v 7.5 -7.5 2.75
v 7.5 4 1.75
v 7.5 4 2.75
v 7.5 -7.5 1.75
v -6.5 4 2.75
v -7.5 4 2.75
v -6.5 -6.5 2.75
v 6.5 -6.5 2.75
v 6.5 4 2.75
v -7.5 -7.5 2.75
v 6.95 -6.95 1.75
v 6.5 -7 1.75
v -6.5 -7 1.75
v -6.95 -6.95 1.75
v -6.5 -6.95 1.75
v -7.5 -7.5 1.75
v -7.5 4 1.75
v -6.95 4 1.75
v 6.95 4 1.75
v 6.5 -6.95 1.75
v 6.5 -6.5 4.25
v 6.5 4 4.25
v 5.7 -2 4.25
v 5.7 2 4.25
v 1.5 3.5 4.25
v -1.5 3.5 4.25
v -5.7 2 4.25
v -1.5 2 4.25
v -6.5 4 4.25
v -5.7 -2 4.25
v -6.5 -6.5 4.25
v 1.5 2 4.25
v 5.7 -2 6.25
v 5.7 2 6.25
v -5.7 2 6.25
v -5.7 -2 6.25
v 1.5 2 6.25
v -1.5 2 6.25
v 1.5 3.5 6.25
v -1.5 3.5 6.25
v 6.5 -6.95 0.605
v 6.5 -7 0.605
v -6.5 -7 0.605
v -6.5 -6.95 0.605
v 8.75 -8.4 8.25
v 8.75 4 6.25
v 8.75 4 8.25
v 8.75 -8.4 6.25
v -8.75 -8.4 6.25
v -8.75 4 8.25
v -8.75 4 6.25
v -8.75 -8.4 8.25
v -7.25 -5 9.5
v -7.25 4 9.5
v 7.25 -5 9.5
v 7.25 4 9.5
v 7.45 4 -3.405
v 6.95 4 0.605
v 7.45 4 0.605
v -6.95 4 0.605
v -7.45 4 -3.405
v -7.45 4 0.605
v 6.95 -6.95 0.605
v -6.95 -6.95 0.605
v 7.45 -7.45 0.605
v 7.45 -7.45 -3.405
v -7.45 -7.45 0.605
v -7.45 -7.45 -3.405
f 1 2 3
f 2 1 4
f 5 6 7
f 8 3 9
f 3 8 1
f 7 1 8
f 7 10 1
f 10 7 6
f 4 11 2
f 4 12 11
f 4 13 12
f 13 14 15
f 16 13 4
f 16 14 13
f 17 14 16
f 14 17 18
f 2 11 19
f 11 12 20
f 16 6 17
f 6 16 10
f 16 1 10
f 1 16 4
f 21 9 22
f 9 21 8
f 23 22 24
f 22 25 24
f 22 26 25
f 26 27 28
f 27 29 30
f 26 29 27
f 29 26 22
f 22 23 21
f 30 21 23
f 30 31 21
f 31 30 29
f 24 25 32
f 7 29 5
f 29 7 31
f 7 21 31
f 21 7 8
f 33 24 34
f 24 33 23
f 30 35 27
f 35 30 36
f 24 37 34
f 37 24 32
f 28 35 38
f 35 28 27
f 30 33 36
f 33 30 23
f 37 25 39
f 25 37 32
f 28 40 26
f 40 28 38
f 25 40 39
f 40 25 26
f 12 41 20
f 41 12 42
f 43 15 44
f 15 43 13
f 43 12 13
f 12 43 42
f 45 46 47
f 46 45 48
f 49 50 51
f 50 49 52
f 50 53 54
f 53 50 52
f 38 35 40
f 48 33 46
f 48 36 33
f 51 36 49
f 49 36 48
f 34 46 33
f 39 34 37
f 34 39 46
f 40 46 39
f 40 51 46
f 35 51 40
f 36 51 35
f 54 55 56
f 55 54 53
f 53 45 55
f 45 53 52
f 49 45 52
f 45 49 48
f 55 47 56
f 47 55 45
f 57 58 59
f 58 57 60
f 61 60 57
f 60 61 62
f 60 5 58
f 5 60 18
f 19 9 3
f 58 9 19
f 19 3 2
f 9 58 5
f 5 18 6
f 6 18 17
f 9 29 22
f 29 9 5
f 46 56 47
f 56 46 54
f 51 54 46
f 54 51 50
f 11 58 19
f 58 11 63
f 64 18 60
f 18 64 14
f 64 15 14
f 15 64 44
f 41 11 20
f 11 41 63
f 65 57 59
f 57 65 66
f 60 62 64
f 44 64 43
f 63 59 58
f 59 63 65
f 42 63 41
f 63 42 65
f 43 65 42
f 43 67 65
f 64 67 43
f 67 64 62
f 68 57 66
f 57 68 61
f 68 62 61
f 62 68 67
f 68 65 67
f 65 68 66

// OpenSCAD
//Enum Switch Type
MX   = 0;  // Generic MX
Choc = 1;  // Low profile
Alps = 2;  // For Your Superiority Complex's Needs

//Switch cutawy Type
Cherry = 0;
Box    = 1;
Alps   = 2;

//Cap type applys to MX only?
//Cherry = 0;
DSA = 1;
SA  = 2;
MT3 = 3;

//parameters
plate_thickness = 1;
plate_size = 15.6;
edge_offset = 1;
bottom_height = 5;
bottom_size = plate_size - 2;

top_height = 11.6;

switch_height = 3.0;
switch_thick = 1;
switch_width = 5;
switch_length = 3;

cap_height = .38*25.4;
cap_heightShift = 0.69*25.4;
cap_width = 18.3;

bottom_height = 4.5;
bottom_chamfer_width = 3.05;
bottom_chamfer_height =  1;
bottom_chamfer_thickness = .6;

bottom_peg_diameter = 4.075/.97;
bottom_peg_height =  3.5;
bottom_peg_chamfer = .5;
bottom_peg_side_scale = 1.7/4;

//dummy key switch with caps to check position
module Switch(switchScale= [1,1,1], CapColor = "ivory", StemColor = "black", clipLength = 0, type = Choc, Caps = DSA, Row = 0)
{
  if (type == MX){
    difference(){
      union(){
        translate([0,0,-switch_height])
        {
          color("grey"){
            translate([-bottom_size/2, -bottom_size/2 ,0])cube([bottom_size,bottom_size,bottom_height]);
            translate([-plate_size/2-edge_offset /2, -plate_size/2-edge_offset/2, bottom_height])cube([15.6+edge_offset ,15.6+edge_offset ,1]);

            translate([-plate_size/2, -plate_size/2, bottom_height])cube([15.6,15.6,1]);
            translate([-plate_size/2, -plate_size/2, bottom_height])cube([15.6,15.6,1]);

            translate([0,0, bottom_height+plate_thickness])translate([-15.6/2,13.6/2,0])rotate([90,0,0])linear_extrude(13.6)polygon(points = [[0,0], [15.6, 0], [13.6, 5.6], [2,5.6]]);
          }

          color(StemColor){
            translate([-switch_width/2, -switch_thick/2, top_height-1])cube([switch_width, switch_thick, switch_height]);
            translate([-switch_thick/2, -switch_length/2, top_height-1])cube([switch_thick, switch_length, switch_height]);
            translate([-plate_size/4, -plate_size/6, top_height-.5])cube([plate_size/2, plate_size/3, 0.25]);
          }

          scale(switchScale)color(CapColor){
            translate([0,0,cap_heightShift-2])rotate([0,0,45])cylinder(d1 = cap_width*sqrt(2),d2 = (plate_size -4)*sqrt(2), 7.5, $fn=4, center = true);
          }

          color("grey"){
            translate([0,0, -(bottom_peg_height -bottom_peg_chamfer)]){
              cylinder(d=bottom_peg_diameter, h= bottom_peg_height -bottom_peg_chamfer);
              translate([5,0,0])scale(v=[bottom_peg_side_scale,bottom_peg_side_scale,1])cylinder(d=bottom_peg_diameter, h= bottom_peg_height -bottom_peg_chamfer);
              translate([-5,0,0])scale(v=[bottom_peg_side_scale,bottom_peg_side_scale,1])cylinder(d=bottom_peg_diameter, h= bottom_peg_height -bottom_peg_chamfer);

              translate([0,0, -bottom_peg_chamfer]){
                cylinder(d2=bottom_peg_diameter , d1 = bottom_peg_diameter -2*bottom_peg_chamfer, h= bottom_peg_chamfer);
                translate([5,0,0])scale(v=[bottom_peg_side_scale,bottom_peg_side_scale,1])cylinder(d2=bottom_peg_diameter , d1 = bottom_peg_diameter -2*bottom_peg_chamfer, h= bottom_peg_chamfer);
                translate([-5,0,0])scale(v=[bottom_peg_side_scale,bottom_peg_side_scale,1])cylinder(d2=bottom_peg_diameter , d1 = bottom_peg_diameter -2*bottom_peg_chamfer, h= bottom_peg_chamfer);
              }
            }
          }
        }
      }
      if (clipLength != 0){ // commiting unholy act in name of ergonomics
        translate([0, -sign(clipLength)*7.8-clipLength,  0])cube([20, 15.6, 40], center = true);
      }
    }
  } else if (type == Choc){
    difference(){
      union(){
        translate([0,0,1.75]){
          difference(){
            translate([0,0,0.5])cube([15,15,1], center = true);
            //cuts
        //    translate([15/2-1/2,0,.5])cube([1,10.5,2], center = true);
        //    translate([-15/2+1/2,0,.5])cube([1,10.5,2], center = true);
          }

          translate([0,0,1.5])cube([13,13,2], center = true);
          color(StemColor)translate([0,0,4])cube([11.4,4,3], center = true);
          color(StemColor)translate([0,1,4])cube([3,5,3], center = true);
          color("DarkSlateGray")translate([0,0,-1])cube([13,14,2,],center = true);
          color("DarkSlateGray")translate([0,0,-2-2.5])cylinder(d=3.3, 2.5);
          color("DarkSlateGray")translate([5,0,-2-2.5])cylinder(d=1.6, 2.5);
          color("DarkSlateGray")translate([-5,0,-2-2.5])cylinder(d=1.6, 2.5);

          //cap
          scale(switchScale)color(CapColor)hull(){
            translate([0,0,4.5+1])cube([17.5,16.8,2],center = true);
            translate([0,1.25,4.5+1+1.5])cube([14.5,12.5,1.5],center = true);
          }
        }
      }
      if (clipLength != 0){ // commiting unholy act in name of ergonomics
        translate([0, -sign(clipLength)*7.8-clipLength,  0])cube([20, 15.6, 40], center = true);
      }
    }
  }
  else if (type == Alps){
    //TODO build Alps MockUp
  }
}

module Cutter()
{
  bottom_height = 4.5;
  bottom_chamfer_width = 3;
  bottom_chamfer_height =  1;
  bottom_chamfer_thickness = .6;

  bottom_peg_diameter = 4;
  bottom_peg_height =  3;
  bottom_peg_chamfer = 1;
  bottom_peg_side_scale = 1.7/4;

  translate([-bottom_size/2, -bottom_size/2 ,0])cube([bottom_size,bottom_size,bottom_height]);

  translate([0,0, -(bottom_peg_height -bottom_peg_chamfer)]){
    cylinder(d=bottom_peg_diameter, h= bottom_peg_height -bottom_peg_chamfer);
    translate([5,0,0])scale(v=[bottom_peg_side_scale,bottom_peg_side_scale,1])cylinder(d=bottom_peg_diameter, h= bottom_peg_height -bottom_peg_chamfer);
    translate([-5,0,0])scale(v=[bottom_peg_side_scale,bottom_peg_side_scale,1])cylinder(d=bottom_peg_diameter, h= bottom_peg_height -bottom_peg_chamfer);

    translate([0,0, -bottom_peg_chamfer]){
      cylinder(d2=bottom_peg_diameter , d1 = bottom_peg_diameter -2*bottom_peg_chamfer, h= bottom_peg_chamfer);
      translate([5,0,0])scale(v=[bottom_peg_side_scale,bottom_peg_side_scale,1])cylinder(d2=bottom_peg_diameter , d1 = bottom_peg_diameter -2*bottom_peg_chamfer, h= bottom_peg_chamfer);
      translate([-5,0,0])scale(v=[bottom_peg_side_scale,bottom_peg_side_scale,1])cylinder(d2=bottom_peg_diameter , d1 = bottom_peg_diameter -2*bottom_peg_chamfer, h= bottom_peg_chamfer);
    }
  }
}

module Keyhole(tol = .1, cutThickness = .5, clipLength = 0, type = Box)
{
  $fn = 10;
  bottom_length = 13.9+tol;
   plate_thickness = 3.51; //mm
  holeLength = bottom_length+tol*2;
  //latch nibs
  nib_radius= 1;
  nib_length = 3;
  if(type == Box){
    translate([0,0,-1.25])difference(){
      union(){
        translate([0,0,1.25])cube([holeLength, holeLength, plate_thickness+tol], center =true);
        translate([0,0,.1-cutThickness/2])cube([holeLength+1, holeLength+1, plate_thickness+cutThickness], center =true);
      }

      union(){
        if (clipLength != 0){
          translate([0, -sign(clipLength)*7.8-clipLength, 0])cube([20, 15.6, 40], center = true);
        }
      }
    }
  } else if (type == Cherry){
    difference(){
      translate([0,0,-cutThickness/2])cube( [holeLength, holeLength, plate_thickness+cutThickness], center =true);

      union(){
        hull(){
          translate([(holeLength)/2, ,0,-plate_thickness/2+nib_radius])rotate([90,0,0])cylinder(r =nib_radius , nib_length,center = true);
          translate([(holeLength)/2, ,-nib_length/2,-plate_thickness/2])cube([nib_radius*2, nib_length, plate_thickness]);
        }
        mirror([1,0,0])hull(){
          translate([(holeLength)/2, ,0,-plate_thickness/2+nib_radius])rotate([90,0,0])cylinder(r =nib_radius , nib_length,center = true);
          translate([(holeLength)/2, ,-nib_length/2,-plate_thickness/2])cube([nib_radius*2, nib_length, plate_thickness]);
        }
        if (clipLength != 0){
          translate([0, -sign(clipLength)*7.8-clipLength, 0])cube([20, 15.6, 40], center = true);
        }
      }
    }
  }
}

module Stabilizer(offsets = 23.8/2)
{
  plate_thickness = 3.6; //mm
  stabilizer_width = 5;
  stabilizer_length = 12.2;
  translate([offsets,0,0])cube([stabilizer_width,stabilizer_length,plate_thickness], center = true);
  translate([-offsets,0,0])cube([stabilizer_width,stabilizer_length,plate_thickness], center = true);
}

module TrackPoint(nibLength = 20)
{
  color("red")translate([0,0,-.5])cube([4.5,4.5,5], center= true); //nib
  color("gold")cylinder(d = 2, nibLength); //nib
  color("gold")translate([0,0,nibLength])sphere(2); //nib
  translate([0,30.3/2-8,-3/2])cube([26.46, 30.3, 3], center = true);
}

module RotaryEncoder(stemLength = 13, Wheel = 0)
{
 color("grey")translate([0,0, -6.1/2])cube([11.5, 13.5, 6.1], center = true);
 cylinder(d = 7, 7.8);

 translate([0,0,7.8])difference(){
   cylinder(d = 5.8, stemLength);
   translate([-5.8/2,5.8/2-1.5,3])cube([11.5, 13.5, stemLength]);
 }
 color("grey")translate([0,0,7.8])cylinder(d = Wheel, stemLength);
}

//################ Test Calls ###################
#Switch(switchScale= [1,1,1],clipLength = -4, type = Choc, StemColor = "purple");
Keyhole(0, clipLength = -4, type = Box);
//Stabilizer(20);
// RotaryEncoder(Wheel = 0);
//Switch([1,1.5,1]);
//TrackPoint();
